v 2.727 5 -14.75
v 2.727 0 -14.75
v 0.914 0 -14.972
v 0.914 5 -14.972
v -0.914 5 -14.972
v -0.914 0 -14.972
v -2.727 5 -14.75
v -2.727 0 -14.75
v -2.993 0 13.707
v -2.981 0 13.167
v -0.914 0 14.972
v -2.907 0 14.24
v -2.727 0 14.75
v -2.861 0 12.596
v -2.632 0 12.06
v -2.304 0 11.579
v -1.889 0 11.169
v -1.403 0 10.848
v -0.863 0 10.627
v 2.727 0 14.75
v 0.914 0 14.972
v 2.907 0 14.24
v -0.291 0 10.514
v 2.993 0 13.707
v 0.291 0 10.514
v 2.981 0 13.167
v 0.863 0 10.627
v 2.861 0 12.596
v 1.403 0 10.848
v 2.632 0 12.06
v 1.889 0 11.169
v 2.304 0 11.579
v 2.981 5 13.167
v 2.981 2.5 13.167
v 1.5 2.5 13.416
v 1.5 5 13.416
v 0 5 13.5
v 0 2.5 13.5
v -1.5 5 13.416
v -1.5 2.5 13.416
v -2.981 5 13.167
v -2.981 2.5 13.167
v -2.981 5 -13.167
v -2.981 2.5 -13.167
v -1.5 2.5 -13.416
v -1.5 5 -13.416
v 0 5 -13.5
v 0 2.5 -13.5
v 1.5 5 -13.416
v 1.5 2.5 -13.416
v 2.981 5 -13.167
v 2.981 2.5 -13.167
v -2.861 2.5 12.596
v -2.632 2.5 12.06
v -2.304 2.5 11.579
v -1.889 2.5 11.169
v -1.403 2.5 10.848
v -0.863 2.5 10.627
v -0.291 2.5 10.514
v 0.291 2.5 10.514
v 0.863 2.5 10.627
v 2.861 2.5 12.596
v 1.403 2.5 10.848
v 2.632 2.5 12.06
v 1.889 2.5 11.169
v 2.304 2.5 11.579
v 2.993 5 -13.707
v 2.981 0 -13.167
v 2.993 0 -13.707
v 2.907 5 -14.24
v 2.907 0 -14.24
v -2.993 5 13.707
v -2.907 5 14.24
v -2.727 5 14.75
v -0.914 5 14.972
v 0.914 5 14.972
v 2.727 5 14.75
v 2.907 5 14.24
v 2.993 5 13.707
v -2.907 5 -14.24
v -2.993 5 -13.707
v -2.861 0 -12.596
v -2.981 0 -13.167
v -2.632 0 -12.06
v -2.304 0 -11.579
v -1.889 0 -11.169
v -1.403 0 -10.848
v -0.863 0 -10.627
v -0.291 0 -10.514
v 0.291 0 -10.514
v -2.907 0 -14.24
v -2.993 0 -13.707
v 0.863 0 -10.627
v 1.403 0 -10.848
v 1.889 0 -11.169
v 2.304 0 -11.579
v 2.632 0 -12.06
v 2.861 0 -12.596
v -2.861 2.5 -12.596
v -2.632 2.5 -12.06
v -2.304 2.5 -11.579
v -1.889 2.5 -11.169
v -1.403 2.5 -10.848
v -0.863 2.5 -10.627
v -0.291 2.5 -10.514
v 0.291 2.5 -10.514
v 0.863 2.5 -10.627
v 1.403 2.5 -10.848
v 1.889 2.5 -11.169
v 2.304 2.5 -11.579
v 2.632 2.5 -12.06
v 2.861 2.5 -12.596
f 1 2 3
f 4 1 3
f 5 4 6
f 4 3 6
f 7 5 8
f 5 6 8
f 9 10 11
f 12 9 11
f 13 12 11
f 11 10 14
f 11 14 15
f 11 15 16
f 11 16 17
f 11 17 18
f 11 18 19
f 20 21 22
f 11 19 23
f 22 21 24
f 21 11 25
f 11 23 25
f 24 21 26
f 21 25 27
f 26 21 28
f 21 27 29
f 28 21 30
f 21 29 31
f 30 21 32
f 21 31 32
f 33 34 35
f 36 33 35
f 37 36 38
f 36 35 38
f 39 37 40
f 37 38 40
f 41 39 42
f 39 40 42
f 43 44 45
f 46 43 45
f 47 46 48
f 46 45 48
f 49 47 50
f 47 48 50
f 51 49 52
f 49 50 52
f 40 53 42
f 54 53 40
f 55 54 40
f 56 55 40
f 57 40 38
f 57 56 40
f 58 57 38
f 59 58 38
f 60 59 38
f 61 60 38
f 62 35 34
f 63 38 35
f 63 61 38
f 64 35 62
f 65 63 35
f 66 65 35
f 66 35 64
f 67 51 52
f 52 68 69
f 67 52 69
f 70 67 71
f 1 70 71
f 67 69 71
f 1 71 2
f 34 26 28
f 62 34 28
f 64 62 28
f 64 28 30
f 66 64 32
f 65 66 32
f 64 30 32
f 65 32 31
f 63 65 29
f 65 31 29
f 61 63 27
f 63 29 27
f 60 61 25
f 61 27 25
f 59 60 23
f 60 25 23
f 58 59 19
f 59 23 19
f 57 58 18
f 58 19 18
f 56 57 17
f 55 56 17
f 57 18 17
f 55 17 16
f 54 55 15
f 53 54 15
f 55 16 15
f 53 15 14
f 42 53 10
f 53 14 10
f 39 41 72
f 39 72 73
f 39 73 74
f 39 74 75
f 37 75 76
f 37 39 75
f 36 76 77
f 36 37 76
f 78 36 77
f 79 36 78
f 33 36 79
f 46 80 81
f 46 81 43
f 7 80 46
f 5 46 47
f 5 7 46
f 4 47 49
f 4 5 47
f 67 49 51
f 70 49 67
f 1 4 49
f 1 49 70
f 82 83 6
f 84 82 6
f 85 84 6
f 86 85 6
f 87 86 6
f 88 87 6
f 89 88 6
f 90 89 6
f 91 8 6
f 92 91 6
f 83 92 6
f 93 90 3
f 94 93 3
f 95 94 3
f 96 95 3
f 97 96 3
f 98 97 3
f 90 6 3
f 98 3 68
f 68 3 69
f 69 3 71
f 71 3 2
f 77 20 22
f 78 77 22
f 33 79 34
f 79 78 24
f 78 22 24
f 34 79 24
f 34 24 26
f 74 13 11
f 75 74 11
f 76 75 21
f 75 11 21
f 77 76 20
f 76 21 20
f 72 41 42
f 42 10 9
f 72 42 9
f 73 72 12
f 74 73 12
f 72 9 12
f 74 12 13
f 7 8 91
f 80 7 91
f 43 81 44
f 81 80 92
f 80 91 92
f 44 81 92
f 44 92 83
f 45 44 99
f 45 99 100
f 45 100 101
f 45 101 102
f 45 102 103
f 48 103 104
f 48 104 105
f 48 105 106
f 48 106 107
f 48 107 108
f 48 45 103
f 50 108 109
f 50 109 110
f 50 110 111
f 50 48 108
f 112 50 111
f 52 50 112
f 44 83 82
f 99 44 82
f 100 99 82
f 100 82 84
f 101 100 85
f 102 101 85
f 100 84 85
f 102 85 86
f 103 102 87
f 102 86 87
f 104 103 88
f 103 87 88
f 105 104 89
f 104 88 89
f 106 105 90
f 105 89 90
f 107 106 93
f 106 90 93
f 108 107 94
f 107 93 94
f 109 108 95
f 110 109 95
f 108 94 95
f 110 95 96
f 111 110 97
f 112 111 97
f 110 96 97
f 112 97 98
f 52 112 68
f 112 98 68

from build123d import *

# Parameters (mm, degrees)
BOSS_EXTRUDE2_DEPTH   = 5
BOSS_EXTRUDE2_2_DEPTH = 5
BOSS_EXTRUDE3_DEPTH   = 2.5


with BuildPart() as part:
    # Sketch2 → Boss-Extrude2 (new body)
    with BuildSketch(Plane(origin=(0, 0, 0), x_dir=(1, 0, 0), z_dir=(0, 1, 0))):
        with BuildLine():
            ThreePointArc((-2.98142397, 13.166666667), (0, 13.5), (2.98142397, 13.166666667))
            ThreePointArc((2.98142397, 13.166666667), (2.962055082, 13.975636094), (2.727178029, 14.75))
            ThreePointArc((2.727178029, 14.75), (0, 15), (-2.727178029, 14.75))
            ThreePointArc((-2.727178029, 14.75), (-2.962055082, 13.975636094), (-2.98142397, 13.166666667))
        make_face()
    extrude(amount=BOSS_EXTRUDE2_DEPTH)



with BuildPart() as body_2:
    # Sketch2 → Boss-Extrude2 2 (new body)
    with BuildSketch(Plane(origin=(0, 0, 0), x_dir=(1, 0, 0), z_dir=(0, 1, 0))):
        with BuildLine():
            ThreePointArc((2.727178029, -14.75), (2.962055082, -13.975636094), (2.98142397, -13.166666667))
            ThreePointArc((2.98142397, -13.166666667), (0, -13.5), (-2.98142397, -13.166666667))
            ThreePointArc((-2.98142397, -13.166666667), (-2.962055082, -13.975636094), (-2.727178029, -14.75))
            ThreePointArc((-2.727178029, -14.75), (0, -15), (2.727178029, -14.75))
        make_face()
    extrude(amount=BOSS_EXTRUDE2_2_DEPTH)


with BuildPart() as part_1:
    add(part.part)

    add(body_2.part)  # Boss-Extrude3 merges body 2
    # Sketch2<6> → Boss-Extrude3 (add)
    with BuildSketch(Plane(origin=(0, 0, 0), x_dir=(1, 0, 0), z_dir=(0, 1, 0))):
        with BuildLine():
            ThreePointArc((-2.98142397, 13.166666667), (0, 10.5), (2.98142397, 13.166666667))
            ThreePointArc((2.98142397, 13.166666667), (0, 13.5), (-2.98142397, 13.166666667))
        make_face()
        with BuildLine():
            ThreePointArc((-2.98142397, -13.166666667), (0, -13.5), (2.98142397, -13.166666667))
            ThreePointArc((2.98142397, -13.166666667), (0, -10.5), (-2.98142397, -13.166666667))
        make_face()
    extrude(amount=BOSS_EXTRUDE3_DEPTH)


solid = part_1.part
